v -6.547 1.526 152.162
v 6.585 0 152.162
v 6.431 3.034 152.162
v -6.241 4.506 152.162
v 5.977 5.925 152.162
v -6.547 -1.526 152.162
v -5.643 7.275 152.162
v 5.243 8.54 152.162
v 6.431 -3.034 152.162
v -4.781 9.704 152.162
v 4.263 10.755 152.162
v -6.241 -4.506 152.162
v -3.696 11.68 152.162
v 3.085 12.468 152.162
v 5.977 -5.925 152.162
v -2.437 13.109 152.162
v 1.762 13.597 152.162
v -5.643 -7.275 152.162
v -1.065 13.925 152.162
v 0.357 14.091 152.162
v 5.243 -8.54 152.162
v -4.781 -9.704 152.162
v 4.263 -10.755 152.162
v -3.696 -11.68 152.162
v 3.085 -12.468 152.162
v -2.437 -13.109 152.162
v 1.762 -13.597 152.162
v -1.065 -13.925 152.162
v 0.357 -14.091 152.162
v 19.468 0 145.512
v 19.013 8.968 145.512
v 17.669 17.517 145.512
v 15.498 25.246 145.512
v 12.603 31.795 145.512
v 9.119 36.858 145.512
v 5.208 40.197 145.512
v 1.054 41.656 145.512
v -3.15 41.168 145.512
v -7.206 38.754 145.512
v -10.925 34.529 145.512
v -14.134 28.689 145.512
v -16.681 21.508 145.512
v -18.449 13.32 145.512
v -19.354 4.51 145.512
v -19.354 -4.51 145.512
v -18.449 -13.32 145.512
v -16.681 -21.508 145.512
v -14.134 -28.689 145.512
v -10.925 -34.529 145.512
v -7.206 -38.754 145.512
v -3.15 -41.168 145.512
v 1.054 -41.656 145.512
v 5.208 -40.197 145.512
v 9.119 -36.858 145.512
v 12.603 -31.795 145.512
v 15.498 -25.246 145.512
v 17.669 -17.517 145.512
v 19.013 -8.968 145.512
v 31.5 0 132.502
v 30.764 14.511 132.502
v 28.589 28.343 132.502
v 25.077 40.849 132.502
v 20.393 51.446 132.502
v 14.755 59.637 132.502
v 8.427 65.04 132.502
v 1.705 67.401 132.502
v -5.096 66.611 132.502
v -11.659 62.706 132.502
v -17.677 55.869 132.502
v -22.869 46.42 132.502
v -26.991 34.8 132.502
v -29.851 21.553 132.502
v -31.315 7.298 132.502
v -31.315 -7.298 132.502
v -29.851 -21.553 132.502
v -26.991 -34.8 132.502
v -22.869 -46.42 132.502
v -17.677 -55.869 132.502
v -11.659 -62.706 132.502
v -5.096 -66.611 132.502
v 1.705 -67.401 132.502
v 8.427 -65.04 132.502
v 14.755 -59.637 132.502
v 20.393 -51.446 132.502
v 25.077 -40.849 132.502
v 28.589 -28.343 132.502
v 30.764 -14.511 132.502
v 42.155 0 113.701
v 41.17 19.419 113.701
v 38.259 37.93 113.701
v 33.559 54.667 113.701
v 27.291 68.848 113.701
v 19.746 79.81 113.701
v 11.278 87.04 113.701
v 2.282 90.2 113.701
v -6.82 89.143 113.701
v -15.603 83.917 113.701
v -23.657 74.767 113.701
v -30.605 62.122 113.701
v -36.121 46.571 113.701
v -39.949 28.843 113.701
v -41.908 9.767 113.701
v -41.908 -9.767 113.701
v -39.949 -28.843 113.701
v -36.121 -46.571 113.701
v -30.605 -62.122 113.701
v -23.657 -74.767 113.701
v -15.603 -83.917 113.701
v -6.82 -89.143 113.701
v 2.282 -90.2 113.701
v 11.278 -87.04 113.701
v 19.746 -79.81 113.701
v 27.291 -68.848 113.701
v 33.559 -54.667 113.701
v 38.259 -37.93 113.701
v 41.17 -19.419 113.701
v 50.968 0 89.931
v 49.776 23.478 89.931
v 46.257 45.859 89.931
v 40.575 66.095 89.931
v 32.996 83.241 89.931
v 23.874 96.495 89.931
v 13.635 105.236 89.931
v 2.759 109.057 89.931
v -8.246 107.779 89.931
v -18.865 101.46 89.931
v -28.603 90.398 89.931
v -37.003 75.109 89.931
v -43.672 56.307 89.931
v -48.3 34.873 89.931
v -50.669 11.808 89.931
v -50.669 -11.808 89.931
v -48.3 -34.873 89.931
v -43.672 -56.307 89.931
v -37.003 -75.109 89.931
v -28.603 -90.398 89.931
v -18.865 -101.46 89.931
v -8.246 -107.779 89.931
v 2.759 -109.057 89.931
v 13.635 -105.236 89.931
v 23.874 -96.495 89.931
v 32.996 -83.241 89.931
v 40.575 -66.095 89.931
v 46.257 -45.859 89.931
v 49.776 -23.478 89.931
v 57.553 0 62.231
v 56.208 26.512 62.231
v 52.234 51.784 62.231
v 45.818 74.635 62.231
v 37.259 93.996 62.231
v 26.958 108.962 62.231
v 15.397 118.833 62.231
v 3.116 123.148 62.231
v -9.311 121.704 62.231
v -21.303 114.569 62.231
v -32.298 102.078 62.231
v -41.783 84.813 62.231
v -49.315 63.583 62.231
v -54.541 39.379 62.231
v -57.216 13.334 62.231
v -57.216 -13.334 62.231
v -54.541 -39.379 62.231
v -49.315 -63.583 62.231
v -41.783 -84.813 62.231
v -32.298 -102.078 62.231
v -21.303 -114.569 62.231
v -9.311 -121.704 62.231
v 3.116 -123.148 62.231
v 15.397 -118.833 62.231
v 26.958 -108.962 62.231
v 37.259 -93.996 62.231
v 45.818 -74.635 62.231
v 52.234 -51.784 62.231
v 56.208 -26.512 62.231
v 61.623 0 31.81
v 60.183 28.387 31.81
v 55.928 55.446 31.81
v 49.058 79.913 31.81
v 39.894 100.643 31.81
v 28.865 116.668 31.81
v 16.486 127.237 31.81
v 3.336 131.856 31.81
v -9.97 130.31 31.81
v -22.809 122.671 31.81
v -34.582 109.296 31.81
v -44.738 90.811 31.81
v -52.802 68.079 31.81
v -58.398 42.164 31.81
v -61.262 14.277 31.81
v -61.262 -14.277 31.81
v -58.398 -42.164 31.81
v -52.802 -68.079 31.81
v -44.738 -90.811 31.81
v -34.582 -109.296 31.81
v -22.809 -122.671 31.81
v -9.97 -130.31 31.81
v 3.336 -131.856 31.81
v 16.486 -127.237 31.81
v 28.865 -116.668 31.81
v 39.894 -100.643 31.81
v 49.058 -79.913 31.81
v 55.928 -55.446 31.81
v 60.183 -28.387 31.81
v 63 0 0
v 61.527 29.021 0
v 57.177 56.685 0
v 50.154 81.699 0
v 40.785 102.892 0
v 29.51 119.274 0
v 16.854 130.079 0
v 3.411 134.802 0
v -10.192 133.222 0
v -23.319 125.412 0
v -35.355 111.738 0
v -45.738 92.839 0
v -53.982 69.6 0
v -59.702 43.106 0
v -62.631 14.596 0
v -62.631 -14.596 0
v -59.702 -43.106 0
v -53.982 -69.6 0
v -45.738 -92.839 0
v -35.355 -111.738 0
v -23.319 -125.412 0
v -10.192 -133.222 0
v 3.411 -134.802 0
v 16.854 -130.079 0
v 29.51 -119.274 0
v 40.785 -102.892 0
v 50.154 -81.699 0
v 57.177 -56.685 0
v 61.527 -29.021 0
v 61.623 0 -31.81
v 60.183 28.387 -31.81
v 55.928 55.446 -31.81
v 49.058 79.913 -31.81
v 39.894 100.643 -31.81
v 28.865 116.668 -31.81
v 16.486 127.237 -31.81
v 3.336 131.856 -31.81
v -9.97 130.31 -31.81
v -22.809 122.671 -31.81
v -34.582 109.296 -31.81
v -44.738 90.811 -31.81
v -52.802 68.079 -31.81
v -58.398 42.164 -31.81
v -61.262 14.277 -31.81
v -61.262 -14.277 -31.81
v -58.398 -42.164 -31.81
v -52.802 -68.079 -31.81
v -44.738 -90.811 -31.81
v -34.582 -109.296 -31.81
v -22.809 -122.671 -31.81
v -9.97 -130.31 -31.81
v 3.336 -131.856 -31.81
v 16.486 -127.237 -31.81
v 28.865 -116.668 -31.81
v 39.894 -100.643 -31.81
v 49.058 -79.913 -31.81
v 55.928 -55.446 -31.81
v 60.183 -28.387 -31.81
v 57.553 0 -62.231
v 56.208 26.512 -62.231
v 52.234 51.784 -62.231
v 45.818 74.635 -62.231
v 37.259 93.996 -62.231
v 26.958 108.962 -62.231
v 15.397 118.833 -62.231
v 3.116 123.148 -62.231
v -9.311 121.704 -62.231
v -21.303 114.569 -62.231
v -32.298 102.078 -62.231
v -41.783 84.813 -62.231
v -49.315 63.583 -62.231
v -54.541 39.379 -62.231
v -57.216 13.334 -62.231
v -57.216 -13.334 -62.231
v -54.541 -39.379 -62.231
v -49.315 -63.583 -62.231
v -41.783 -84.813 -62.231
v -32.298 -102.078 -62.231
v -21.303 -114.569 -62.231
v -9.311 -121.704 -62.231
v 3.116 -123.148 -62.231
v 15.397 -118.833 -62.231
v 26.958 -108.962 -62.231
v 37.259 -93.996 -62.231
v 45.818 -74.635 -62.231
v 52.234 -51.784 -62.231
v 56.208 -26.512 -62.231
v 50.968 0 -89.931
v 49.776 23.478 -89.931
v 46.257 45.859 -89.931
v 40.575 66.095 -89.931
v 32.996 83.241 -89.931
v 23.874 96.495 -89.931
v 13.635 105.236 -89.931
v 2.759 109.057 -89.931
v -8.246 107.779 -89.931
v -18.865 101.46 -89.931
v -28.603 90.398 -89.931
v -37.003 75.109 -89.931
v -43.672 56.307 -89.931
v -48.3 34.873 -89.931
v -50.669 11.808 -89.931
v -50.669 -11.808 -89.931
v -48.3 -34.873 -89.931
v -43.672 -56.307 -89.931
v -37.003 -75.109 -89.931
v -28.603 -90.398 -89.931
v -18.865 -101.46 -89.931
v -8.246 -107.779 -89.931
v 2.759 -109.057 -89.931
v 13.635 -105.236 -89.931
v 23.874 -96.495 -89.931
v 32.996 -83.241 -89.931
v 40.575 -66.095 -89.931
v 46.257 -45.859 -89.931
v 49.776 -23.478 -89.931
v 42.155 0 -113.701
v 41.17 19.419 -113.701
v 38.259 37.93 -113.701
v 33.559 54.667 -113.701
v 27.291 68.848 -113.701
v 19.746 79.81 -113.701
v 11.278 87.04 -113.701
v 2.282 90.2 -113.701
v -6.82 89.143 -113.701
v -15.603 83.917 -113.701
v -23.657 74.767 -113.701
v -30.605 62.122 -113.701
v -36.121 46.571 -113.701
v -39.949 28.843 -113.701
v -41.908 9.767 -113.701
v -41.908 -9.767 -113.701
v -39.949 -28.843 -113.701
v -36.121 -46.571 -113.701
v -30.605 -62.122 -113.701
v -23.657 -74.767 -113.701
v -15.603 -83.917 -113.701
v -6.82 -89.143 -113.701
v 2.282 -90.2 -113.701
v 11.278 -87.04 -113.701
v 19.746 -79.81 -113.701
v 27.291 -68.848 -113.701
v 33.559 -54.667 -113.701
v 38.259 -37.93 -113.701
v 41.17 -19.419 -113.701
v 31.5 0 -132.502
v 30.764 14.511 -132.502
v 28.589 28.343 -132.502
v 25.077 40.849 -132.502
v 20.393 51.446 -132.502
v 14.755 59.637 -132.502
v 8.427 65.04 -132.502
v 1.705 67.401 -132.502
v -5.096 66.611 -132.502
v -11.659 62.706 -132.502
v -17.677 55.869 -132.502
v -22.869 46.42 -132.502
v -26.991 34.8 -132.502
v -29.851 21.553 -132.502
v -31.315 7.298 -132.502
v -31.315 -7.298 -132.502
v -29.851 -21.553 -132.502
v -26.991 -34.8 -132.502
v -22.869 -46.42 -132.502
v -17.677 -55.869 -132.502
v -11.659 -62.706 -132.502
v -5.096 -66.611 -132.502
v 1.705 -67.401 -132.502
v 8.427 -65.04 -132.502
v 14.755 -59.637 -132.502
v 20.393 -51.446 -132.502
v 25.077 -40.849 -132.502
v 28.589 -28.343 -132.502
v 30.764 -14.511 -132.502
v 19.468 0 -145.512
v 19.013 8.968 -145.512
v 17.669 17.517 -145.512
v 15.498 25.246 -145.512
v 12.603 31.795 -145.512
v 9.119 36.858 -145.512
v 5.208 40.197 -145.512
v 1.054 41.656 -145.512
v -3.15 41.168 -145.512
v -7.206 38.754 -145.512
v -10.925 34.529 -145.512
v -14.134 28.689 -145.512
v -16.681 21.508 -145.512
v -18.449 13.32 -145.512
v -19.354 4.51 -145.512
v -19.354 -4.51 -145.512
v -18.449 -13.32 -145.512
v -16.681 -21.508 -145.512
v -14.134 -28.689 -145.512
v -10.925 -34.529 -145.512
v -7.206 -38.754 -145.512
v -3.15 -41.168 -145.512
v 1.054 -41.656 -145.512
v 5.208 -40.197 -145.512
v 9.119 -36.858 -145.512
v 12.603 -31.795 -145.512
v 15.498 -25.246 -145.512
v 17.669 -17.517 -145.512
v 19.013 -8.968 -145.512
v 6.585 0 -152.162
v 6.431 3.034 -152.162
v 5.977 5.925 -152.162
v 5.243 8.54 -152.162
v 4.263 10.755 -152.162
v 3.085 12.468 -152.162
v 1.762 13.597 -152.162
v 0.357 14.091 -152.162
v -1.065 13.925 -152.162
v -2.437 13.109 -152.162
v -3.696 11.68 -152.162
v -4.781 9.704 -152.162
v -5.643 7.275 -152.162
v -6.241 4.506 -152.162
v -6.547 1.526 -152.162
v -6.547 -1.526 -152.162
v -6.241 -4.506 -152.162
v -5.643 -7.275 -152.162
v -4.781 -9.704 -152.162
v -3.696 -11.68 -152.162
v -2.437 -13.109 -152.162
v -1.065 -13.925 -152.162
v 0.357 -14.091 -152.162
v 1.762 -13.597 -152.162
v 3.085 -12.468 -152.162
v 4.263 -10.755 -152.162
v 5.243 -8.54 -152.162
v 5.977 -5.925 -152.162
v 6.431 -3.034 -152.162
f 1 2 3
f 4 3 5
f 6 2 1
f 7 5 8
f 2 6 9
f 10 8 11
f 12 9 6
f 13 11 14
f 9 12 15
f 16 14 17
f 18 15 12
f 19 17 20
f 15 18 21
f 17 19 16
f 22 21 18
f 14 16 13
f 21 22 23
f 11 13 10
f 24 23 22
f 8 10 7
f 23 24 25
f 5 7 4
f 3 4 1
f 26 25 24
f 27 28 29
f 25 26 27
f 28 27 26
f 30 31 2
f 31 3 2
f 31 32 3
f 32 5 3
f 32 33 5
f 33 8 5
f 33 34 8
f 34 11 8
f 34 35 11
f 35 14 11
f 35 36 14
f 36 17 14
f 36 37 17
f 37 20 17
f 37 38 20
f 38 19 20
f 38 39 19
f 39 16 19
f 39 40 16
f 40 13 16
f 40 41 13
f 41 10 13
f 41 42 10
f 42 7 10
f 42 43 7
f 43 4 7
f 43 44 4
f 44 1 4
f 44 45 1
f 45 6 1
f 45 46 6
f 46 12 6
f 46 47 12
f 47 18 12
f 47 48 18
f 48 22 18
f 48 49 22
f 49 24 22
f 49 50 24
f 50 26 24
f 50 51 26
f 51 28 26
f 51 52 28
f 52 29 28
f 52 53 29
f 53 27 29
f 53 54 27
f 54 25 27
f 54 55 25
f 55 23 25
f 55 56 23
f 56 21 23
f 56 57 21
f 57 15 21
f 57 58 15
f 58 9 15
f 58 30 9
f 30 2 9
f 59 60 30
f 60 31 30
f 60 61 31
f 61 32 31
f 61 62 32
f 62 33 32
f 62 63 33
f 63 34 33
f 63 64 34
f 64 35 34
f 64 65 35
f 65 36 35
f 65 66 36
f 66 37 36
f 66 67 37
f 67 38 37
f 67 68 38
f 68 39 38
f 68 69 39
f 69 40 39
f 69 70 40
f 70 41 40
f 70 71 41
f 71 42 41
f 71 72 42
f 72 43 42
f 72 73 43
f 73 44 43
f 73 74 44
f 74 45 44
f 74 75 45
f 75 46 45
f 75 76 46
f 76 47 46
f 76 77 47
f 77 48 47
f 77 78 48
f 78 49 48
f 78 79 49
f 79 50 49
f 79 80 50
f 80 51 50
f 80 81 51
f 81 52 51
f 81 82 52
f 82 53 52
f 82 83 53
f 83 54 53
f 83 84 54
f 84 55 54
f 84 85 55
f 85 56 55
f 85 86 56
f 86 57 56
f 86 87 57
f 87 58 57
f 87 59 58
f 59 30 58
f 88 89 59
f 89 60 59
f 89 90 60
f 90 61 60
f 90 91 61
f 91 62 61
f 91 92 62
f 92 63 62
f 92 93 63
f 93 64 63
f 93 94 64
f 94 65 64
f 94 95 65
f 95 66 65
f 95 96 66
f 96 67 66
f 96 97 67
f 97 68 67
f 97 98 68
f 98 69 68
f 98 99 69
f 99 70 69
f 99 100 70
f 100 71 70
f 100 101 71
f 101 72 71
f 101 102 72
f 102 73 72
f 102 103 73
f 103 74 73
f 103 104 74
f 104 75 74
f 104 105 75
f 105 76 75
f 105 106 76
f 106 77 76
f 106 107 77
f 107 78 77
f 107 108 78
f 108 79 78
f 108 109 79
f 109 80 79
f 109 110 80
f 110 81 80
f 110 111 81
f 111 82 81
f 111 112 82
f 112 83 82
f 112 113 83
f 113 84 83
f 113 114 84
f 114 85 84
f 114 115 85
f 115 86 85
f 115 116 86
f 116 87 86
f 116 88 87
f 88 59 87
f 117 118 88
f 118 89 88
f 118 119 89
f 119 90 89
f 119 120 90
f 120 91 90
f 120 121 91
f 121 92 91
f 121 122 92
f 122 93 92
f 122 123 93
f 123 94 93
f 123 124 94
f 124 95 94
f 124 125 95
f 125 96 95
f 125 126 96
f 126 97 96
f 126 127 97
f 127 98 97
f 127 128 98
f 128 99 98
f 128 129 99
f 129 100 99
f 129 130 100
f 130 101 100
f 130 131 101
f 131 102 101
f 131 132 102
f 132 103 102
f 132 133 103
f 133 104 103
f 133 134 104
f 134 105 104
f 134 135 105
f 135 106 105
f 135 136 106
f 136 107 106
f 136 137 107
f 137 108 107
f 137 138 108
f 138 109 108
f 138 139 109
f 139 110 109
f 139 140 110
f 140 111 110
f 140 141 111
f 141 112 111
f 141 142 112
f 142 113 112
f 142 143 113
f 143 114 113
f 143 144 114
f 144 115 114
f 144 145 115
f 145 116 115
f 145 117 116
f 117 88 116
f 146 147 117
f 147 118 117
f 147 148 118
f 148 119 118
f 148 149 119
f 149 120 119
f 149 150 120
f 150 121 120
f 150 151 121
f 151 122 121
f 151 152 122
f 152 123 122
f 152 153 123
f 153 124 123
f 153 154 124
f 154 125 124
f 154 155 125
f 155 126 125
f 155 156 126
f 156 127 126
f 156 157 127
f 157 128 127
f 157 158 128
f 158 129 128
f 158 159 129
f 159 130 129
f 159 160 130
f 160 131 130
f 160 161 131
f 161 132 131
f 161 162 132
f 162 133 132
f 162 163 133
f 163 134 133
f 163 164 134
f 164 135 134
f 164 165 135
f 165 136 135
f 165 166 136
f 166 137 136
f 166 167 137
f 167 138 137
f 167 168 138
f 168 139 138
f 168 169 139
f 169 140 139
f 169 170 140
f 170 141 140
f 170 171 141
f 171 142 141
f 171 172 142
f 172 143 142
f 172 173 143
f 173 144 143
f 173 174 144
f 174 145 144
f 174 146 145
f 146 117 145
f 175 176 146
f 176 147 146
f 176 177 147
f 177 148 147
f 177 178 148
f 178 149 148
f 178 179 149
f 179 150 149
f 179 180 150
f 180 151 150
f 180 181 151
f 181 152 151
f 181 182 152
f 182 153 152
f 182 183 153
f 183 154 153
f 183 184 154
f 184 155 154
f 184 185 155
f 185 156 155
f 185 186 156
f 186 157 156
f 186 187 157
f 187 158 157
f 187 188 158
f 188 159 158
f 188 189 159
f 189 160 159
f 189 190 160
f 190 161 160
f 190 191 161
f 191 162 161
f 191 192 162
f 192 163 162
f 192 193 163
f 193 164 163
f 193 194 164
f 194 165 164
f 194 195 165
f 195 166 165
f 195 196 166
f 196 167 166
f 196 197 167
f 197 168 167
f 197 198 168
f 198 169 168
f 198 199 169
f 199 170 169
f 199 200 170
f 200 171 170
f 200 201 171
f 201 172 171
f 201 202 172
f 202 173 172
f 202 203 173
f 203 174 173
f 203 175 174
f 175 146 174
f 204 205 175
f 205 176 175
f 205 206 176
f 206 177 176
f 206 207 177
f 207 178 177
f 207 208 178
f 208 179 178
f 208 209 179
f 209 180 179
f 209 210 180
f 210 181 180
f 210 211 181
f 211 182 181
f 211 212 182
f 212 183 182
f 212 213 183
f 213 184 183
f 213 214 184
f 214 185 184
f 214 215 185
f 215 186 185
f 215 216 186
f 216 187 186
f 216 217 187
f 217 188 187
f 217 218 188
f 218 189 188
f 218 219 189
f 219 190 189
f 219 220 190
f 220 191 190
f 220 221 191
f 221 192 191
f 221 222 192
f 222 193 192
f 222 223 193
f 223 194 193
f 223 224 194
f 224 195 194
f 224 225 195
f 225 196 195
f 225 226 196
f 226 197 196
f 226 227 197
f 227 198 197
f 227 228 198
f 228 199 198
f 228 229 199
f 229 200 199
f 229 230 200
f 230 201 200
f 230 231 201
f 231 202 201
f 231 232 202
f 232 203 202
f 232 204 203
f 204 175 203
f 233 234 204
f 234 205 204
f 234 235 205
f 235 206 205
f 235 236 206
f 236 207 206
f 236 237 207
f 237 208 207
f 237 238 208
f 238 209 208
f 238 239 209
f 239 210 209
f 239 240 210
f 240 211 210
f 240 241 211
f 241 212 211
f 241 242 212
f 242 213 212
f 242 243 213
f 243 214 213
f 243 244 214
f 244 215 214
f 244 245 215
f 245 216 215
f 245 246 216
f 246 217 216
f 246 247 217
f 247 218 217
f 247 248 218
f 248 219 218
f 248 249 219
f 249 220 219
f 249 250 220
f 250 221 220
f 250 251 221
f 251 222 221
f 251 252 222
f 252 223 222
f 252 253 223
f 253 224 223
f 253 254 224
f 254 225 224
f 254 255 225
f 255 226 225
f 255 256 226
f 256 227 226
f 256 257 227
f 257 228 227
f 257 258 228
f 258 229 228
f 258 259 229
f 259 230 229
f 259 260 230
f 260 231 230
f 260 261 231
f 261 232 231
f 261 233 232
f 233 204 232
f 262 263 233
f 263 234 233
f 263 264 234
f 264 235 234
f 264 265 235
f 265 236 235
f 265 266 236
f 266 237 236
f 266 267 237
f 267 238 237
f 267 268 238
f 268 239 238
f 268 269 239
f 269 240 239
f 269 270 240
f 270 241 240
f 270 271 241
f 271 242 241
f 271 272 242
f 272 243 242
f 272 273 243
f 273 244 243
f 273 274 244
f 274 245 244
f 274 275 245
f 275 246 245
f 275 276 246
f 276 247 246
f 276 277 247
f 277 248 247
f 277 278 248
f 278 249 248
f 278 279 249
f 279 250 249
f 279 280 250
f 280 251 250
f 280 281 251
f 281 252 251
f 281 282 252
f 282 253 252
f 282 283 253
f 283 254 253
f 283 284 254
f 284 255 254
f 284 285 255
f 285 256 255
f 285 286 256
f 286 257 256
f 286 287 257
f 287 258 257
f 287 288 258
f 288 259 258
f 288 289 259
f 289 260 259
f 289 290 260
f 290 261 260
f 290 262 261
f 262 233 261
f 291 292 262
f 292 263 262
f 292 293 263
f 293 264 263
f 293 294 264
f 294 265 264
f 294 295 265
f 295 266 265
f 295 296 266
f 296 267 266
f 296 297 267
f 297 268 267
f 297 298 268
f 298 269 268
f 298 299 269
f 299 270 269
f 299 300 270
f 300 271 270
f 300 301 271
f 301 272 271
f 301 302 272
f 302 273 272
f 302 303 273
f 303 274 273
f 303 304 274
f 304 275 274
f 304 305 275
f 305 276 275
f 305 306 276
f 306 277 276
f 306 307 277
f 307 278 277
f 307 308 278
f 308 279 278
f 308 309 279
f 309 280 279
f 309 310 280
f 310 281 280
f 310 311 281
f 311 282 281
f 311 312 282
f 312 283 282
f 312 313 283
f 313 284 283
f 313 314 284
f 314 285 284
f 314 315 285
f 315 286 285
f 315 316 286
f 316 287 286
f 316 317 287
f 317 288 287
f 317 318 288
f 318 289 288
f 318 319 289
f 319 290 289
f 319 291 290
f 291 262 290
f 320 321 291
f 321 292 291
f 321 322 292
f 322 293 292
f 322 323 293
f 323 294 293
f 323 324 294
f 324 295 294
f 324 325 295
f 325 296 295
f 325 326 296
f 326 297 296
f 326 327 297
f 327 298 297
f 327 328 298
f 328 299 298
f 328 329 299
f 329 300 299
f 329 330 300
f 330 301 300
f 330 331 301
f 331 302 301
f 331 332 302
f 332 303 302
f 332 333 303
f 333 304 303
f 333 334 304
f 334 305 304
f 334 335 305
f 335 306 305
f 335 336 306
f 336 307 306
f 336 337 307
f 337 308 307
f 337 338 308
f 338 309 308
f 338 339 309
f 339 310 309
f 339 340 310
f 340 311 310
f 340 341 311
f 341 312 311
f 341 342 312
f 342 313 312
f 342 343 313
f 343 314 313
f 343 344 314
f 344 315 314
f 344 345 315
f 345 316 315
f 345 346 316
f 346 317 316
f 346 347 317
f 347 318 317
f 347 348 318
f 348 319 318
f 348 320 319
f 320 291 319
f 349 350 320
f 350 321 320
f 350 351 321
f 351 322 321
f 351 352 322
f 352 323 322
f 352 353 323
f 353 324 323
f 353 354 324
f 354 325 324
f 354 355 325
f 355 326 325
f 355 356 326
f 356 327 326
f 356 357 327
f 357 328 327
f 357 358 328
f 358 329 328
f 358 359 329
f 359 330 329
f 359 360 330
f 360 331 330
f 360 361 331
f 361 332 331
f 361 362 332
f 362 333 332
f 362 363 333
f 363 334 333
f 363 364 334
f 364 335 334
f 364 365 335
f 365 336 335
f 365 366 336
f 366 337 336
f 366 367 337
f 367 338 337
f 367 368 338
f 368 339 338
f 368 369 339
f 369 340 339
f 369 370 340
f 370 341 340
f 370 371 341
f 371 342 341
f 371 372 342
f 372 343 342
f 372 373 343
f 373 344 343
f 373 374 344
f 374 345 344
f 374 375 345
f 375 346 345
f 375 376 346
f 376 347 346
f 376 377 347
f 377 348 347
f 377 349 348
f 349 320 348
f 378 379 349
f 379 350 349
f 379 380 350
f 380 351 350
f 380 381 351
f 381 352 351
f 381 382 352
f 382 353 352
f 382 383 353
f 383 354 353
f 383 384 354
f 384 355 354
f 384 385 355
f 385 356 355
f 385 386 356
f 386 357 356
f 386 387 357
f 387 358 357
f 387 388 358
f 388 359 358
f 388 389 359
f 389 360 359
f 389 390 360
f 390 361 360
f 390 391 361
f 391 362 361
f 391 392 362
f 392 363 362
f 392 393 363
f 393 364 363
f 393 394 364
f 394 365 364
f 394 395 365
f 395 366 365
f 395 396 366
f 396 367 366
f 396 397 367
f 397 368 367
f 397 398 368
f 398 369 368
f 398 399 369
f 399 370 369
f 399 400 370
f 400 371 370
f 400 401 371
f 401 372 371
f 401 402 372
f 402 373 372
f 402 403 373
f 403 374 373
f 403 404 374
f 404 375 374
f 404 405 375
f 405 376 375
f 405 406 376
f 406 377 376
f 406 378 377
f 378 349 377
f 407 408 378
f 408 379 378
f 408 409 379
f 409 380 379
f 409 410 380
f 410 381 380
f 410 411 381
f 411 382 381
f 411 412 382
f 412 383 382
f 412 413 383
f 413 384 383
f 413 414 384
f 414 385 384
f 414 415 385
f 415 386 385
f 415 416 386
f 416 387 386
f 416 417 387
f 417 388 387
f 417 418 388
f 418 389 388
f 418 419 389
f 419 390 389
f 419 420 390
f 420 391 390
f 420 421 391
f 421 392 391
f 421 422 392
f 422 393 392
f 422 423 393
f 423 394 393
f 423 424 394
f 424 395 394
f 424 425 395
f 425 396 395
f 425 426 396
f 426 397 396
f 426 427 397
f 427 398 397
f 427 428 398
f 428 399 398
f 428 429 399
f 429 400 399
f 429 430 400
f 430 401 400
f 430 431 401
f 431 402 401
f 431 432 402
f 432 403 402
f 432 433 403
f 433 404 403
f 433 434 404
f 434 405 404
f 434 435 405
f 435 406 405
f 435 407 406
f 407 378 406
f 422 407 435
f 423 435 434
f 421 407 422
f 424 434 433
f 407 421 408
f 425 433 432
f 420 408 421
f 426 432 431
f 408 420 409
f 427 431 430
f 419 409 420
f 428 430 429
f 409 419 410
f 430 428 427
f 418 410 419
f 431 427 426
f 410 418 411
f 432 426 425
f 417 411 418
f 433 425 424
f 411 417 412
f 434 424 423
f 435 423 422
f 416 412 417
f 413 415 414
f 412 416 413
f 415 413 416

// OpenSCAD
// Generated by SolidPython 1.0.1 on 2020-07-29 00:46:48


scale(v = [7, 15, 17]) {
	sphere(r = 9);
}
/***********************************************
*********      SolidPython code:      **********
************************************************
 
# import packages: SolidPython
from solid import *
from solid.utils import *
from itertools import chain, combinations, permutations


class Resize:

    def __init__(self, scad_file):
        self.scad_file = scad_file
        #self.scad_file = import_scad(scad_file)
        # cone/cylinder param:
        self.r1 = 0
        self.r2 = 0
        self.h = 0
        # rectangular prism param:
        self.w = 0
        self.l = 0
        # ellipse param:
        self.r = 0

    # import OpenScad code (file name corresponds to shape)


    # classify shape + parameters
    def assign(self, param1, param2, param3):
        if self.scad_file == 'cone.scad':
            self.r1 = param1
            self.r2 = param2
            self.h = param3
        elif self.scad_file == 'cylinder.scad':
            self.r1 = param1
            self.r2 = param2
            self.h = param3
        elif self.scad_file == 'rectangularPrism.scad':
            self.h = param1
            self.l = param2
            self.w = param3
        else:
            self.r = param1
            self.h = param2

    # resize parameters
    def iterate(self):
        x = range(3, 20, 2)
        i = 1
        if self.scad_file == 'cone.scad':
            tempList = list(permutations(x, 2))
            for temp in tempList:
                param1 = temp[0]
                param2 = temp[1]
                filepath = 'produced_scad_files/' + 'cone' + str(param1) + '_' + str(param2) + '_' + '.scad'
                scad_render_to_file(cylinder(h=param1, r1=param2, r2=0), filepath)

        elif self.scad_file == 'cylinder.scad':
            tempList = list(permutations(x, 3))
            for temp in tempList:
                param1 = temp[0]
                param2 = temp[1]
                filepath = 'produced_scad_files/' + 'cylinder' + str(param1) + '_' + str(param2) + '_' + '.scad'
                scad_render_to_file(cylinder(h=param1, r1=param2, r2=param2), filepath)

        elif self.scad_file == 'rectangularPrism.scad':
            tempList = list(permutations(x, 3))
            for temp in tempList:
                param1 = temp[0]
                param2 = temp[1]
                param3 = temp[2]
                filepath = 'produced_scad_files/' + 'rectangularPrism' + str(param1) + '_' + str(param2) + '_' + str(
                    param3) + '.scad'
                scad_render_to_file(cube(size=(param1, param2, param3)), filepath)

        elif self.scad_file == 'ellipse.scad':
            tempList = list(permutations(x, 4))
            for temp in tempList:
                param1 = temp[0]
                param2 = temp[1]
                param3 = temp[2]
                param4 = temp[3]
                filepath = 'produced_scad_files/' + 'ellipse' + str(param1) + '_' + str(param2) + '_' + str(param3) + '_' + str(param4) + '.scad'
                scad_render_to_file(scale([param1, param2, param3])(sphere(r=param4)), filepath)

    def render_to_scadfile(self):
        scad_render_to_file(scad, 'example.scad') 
 
************************************************/
